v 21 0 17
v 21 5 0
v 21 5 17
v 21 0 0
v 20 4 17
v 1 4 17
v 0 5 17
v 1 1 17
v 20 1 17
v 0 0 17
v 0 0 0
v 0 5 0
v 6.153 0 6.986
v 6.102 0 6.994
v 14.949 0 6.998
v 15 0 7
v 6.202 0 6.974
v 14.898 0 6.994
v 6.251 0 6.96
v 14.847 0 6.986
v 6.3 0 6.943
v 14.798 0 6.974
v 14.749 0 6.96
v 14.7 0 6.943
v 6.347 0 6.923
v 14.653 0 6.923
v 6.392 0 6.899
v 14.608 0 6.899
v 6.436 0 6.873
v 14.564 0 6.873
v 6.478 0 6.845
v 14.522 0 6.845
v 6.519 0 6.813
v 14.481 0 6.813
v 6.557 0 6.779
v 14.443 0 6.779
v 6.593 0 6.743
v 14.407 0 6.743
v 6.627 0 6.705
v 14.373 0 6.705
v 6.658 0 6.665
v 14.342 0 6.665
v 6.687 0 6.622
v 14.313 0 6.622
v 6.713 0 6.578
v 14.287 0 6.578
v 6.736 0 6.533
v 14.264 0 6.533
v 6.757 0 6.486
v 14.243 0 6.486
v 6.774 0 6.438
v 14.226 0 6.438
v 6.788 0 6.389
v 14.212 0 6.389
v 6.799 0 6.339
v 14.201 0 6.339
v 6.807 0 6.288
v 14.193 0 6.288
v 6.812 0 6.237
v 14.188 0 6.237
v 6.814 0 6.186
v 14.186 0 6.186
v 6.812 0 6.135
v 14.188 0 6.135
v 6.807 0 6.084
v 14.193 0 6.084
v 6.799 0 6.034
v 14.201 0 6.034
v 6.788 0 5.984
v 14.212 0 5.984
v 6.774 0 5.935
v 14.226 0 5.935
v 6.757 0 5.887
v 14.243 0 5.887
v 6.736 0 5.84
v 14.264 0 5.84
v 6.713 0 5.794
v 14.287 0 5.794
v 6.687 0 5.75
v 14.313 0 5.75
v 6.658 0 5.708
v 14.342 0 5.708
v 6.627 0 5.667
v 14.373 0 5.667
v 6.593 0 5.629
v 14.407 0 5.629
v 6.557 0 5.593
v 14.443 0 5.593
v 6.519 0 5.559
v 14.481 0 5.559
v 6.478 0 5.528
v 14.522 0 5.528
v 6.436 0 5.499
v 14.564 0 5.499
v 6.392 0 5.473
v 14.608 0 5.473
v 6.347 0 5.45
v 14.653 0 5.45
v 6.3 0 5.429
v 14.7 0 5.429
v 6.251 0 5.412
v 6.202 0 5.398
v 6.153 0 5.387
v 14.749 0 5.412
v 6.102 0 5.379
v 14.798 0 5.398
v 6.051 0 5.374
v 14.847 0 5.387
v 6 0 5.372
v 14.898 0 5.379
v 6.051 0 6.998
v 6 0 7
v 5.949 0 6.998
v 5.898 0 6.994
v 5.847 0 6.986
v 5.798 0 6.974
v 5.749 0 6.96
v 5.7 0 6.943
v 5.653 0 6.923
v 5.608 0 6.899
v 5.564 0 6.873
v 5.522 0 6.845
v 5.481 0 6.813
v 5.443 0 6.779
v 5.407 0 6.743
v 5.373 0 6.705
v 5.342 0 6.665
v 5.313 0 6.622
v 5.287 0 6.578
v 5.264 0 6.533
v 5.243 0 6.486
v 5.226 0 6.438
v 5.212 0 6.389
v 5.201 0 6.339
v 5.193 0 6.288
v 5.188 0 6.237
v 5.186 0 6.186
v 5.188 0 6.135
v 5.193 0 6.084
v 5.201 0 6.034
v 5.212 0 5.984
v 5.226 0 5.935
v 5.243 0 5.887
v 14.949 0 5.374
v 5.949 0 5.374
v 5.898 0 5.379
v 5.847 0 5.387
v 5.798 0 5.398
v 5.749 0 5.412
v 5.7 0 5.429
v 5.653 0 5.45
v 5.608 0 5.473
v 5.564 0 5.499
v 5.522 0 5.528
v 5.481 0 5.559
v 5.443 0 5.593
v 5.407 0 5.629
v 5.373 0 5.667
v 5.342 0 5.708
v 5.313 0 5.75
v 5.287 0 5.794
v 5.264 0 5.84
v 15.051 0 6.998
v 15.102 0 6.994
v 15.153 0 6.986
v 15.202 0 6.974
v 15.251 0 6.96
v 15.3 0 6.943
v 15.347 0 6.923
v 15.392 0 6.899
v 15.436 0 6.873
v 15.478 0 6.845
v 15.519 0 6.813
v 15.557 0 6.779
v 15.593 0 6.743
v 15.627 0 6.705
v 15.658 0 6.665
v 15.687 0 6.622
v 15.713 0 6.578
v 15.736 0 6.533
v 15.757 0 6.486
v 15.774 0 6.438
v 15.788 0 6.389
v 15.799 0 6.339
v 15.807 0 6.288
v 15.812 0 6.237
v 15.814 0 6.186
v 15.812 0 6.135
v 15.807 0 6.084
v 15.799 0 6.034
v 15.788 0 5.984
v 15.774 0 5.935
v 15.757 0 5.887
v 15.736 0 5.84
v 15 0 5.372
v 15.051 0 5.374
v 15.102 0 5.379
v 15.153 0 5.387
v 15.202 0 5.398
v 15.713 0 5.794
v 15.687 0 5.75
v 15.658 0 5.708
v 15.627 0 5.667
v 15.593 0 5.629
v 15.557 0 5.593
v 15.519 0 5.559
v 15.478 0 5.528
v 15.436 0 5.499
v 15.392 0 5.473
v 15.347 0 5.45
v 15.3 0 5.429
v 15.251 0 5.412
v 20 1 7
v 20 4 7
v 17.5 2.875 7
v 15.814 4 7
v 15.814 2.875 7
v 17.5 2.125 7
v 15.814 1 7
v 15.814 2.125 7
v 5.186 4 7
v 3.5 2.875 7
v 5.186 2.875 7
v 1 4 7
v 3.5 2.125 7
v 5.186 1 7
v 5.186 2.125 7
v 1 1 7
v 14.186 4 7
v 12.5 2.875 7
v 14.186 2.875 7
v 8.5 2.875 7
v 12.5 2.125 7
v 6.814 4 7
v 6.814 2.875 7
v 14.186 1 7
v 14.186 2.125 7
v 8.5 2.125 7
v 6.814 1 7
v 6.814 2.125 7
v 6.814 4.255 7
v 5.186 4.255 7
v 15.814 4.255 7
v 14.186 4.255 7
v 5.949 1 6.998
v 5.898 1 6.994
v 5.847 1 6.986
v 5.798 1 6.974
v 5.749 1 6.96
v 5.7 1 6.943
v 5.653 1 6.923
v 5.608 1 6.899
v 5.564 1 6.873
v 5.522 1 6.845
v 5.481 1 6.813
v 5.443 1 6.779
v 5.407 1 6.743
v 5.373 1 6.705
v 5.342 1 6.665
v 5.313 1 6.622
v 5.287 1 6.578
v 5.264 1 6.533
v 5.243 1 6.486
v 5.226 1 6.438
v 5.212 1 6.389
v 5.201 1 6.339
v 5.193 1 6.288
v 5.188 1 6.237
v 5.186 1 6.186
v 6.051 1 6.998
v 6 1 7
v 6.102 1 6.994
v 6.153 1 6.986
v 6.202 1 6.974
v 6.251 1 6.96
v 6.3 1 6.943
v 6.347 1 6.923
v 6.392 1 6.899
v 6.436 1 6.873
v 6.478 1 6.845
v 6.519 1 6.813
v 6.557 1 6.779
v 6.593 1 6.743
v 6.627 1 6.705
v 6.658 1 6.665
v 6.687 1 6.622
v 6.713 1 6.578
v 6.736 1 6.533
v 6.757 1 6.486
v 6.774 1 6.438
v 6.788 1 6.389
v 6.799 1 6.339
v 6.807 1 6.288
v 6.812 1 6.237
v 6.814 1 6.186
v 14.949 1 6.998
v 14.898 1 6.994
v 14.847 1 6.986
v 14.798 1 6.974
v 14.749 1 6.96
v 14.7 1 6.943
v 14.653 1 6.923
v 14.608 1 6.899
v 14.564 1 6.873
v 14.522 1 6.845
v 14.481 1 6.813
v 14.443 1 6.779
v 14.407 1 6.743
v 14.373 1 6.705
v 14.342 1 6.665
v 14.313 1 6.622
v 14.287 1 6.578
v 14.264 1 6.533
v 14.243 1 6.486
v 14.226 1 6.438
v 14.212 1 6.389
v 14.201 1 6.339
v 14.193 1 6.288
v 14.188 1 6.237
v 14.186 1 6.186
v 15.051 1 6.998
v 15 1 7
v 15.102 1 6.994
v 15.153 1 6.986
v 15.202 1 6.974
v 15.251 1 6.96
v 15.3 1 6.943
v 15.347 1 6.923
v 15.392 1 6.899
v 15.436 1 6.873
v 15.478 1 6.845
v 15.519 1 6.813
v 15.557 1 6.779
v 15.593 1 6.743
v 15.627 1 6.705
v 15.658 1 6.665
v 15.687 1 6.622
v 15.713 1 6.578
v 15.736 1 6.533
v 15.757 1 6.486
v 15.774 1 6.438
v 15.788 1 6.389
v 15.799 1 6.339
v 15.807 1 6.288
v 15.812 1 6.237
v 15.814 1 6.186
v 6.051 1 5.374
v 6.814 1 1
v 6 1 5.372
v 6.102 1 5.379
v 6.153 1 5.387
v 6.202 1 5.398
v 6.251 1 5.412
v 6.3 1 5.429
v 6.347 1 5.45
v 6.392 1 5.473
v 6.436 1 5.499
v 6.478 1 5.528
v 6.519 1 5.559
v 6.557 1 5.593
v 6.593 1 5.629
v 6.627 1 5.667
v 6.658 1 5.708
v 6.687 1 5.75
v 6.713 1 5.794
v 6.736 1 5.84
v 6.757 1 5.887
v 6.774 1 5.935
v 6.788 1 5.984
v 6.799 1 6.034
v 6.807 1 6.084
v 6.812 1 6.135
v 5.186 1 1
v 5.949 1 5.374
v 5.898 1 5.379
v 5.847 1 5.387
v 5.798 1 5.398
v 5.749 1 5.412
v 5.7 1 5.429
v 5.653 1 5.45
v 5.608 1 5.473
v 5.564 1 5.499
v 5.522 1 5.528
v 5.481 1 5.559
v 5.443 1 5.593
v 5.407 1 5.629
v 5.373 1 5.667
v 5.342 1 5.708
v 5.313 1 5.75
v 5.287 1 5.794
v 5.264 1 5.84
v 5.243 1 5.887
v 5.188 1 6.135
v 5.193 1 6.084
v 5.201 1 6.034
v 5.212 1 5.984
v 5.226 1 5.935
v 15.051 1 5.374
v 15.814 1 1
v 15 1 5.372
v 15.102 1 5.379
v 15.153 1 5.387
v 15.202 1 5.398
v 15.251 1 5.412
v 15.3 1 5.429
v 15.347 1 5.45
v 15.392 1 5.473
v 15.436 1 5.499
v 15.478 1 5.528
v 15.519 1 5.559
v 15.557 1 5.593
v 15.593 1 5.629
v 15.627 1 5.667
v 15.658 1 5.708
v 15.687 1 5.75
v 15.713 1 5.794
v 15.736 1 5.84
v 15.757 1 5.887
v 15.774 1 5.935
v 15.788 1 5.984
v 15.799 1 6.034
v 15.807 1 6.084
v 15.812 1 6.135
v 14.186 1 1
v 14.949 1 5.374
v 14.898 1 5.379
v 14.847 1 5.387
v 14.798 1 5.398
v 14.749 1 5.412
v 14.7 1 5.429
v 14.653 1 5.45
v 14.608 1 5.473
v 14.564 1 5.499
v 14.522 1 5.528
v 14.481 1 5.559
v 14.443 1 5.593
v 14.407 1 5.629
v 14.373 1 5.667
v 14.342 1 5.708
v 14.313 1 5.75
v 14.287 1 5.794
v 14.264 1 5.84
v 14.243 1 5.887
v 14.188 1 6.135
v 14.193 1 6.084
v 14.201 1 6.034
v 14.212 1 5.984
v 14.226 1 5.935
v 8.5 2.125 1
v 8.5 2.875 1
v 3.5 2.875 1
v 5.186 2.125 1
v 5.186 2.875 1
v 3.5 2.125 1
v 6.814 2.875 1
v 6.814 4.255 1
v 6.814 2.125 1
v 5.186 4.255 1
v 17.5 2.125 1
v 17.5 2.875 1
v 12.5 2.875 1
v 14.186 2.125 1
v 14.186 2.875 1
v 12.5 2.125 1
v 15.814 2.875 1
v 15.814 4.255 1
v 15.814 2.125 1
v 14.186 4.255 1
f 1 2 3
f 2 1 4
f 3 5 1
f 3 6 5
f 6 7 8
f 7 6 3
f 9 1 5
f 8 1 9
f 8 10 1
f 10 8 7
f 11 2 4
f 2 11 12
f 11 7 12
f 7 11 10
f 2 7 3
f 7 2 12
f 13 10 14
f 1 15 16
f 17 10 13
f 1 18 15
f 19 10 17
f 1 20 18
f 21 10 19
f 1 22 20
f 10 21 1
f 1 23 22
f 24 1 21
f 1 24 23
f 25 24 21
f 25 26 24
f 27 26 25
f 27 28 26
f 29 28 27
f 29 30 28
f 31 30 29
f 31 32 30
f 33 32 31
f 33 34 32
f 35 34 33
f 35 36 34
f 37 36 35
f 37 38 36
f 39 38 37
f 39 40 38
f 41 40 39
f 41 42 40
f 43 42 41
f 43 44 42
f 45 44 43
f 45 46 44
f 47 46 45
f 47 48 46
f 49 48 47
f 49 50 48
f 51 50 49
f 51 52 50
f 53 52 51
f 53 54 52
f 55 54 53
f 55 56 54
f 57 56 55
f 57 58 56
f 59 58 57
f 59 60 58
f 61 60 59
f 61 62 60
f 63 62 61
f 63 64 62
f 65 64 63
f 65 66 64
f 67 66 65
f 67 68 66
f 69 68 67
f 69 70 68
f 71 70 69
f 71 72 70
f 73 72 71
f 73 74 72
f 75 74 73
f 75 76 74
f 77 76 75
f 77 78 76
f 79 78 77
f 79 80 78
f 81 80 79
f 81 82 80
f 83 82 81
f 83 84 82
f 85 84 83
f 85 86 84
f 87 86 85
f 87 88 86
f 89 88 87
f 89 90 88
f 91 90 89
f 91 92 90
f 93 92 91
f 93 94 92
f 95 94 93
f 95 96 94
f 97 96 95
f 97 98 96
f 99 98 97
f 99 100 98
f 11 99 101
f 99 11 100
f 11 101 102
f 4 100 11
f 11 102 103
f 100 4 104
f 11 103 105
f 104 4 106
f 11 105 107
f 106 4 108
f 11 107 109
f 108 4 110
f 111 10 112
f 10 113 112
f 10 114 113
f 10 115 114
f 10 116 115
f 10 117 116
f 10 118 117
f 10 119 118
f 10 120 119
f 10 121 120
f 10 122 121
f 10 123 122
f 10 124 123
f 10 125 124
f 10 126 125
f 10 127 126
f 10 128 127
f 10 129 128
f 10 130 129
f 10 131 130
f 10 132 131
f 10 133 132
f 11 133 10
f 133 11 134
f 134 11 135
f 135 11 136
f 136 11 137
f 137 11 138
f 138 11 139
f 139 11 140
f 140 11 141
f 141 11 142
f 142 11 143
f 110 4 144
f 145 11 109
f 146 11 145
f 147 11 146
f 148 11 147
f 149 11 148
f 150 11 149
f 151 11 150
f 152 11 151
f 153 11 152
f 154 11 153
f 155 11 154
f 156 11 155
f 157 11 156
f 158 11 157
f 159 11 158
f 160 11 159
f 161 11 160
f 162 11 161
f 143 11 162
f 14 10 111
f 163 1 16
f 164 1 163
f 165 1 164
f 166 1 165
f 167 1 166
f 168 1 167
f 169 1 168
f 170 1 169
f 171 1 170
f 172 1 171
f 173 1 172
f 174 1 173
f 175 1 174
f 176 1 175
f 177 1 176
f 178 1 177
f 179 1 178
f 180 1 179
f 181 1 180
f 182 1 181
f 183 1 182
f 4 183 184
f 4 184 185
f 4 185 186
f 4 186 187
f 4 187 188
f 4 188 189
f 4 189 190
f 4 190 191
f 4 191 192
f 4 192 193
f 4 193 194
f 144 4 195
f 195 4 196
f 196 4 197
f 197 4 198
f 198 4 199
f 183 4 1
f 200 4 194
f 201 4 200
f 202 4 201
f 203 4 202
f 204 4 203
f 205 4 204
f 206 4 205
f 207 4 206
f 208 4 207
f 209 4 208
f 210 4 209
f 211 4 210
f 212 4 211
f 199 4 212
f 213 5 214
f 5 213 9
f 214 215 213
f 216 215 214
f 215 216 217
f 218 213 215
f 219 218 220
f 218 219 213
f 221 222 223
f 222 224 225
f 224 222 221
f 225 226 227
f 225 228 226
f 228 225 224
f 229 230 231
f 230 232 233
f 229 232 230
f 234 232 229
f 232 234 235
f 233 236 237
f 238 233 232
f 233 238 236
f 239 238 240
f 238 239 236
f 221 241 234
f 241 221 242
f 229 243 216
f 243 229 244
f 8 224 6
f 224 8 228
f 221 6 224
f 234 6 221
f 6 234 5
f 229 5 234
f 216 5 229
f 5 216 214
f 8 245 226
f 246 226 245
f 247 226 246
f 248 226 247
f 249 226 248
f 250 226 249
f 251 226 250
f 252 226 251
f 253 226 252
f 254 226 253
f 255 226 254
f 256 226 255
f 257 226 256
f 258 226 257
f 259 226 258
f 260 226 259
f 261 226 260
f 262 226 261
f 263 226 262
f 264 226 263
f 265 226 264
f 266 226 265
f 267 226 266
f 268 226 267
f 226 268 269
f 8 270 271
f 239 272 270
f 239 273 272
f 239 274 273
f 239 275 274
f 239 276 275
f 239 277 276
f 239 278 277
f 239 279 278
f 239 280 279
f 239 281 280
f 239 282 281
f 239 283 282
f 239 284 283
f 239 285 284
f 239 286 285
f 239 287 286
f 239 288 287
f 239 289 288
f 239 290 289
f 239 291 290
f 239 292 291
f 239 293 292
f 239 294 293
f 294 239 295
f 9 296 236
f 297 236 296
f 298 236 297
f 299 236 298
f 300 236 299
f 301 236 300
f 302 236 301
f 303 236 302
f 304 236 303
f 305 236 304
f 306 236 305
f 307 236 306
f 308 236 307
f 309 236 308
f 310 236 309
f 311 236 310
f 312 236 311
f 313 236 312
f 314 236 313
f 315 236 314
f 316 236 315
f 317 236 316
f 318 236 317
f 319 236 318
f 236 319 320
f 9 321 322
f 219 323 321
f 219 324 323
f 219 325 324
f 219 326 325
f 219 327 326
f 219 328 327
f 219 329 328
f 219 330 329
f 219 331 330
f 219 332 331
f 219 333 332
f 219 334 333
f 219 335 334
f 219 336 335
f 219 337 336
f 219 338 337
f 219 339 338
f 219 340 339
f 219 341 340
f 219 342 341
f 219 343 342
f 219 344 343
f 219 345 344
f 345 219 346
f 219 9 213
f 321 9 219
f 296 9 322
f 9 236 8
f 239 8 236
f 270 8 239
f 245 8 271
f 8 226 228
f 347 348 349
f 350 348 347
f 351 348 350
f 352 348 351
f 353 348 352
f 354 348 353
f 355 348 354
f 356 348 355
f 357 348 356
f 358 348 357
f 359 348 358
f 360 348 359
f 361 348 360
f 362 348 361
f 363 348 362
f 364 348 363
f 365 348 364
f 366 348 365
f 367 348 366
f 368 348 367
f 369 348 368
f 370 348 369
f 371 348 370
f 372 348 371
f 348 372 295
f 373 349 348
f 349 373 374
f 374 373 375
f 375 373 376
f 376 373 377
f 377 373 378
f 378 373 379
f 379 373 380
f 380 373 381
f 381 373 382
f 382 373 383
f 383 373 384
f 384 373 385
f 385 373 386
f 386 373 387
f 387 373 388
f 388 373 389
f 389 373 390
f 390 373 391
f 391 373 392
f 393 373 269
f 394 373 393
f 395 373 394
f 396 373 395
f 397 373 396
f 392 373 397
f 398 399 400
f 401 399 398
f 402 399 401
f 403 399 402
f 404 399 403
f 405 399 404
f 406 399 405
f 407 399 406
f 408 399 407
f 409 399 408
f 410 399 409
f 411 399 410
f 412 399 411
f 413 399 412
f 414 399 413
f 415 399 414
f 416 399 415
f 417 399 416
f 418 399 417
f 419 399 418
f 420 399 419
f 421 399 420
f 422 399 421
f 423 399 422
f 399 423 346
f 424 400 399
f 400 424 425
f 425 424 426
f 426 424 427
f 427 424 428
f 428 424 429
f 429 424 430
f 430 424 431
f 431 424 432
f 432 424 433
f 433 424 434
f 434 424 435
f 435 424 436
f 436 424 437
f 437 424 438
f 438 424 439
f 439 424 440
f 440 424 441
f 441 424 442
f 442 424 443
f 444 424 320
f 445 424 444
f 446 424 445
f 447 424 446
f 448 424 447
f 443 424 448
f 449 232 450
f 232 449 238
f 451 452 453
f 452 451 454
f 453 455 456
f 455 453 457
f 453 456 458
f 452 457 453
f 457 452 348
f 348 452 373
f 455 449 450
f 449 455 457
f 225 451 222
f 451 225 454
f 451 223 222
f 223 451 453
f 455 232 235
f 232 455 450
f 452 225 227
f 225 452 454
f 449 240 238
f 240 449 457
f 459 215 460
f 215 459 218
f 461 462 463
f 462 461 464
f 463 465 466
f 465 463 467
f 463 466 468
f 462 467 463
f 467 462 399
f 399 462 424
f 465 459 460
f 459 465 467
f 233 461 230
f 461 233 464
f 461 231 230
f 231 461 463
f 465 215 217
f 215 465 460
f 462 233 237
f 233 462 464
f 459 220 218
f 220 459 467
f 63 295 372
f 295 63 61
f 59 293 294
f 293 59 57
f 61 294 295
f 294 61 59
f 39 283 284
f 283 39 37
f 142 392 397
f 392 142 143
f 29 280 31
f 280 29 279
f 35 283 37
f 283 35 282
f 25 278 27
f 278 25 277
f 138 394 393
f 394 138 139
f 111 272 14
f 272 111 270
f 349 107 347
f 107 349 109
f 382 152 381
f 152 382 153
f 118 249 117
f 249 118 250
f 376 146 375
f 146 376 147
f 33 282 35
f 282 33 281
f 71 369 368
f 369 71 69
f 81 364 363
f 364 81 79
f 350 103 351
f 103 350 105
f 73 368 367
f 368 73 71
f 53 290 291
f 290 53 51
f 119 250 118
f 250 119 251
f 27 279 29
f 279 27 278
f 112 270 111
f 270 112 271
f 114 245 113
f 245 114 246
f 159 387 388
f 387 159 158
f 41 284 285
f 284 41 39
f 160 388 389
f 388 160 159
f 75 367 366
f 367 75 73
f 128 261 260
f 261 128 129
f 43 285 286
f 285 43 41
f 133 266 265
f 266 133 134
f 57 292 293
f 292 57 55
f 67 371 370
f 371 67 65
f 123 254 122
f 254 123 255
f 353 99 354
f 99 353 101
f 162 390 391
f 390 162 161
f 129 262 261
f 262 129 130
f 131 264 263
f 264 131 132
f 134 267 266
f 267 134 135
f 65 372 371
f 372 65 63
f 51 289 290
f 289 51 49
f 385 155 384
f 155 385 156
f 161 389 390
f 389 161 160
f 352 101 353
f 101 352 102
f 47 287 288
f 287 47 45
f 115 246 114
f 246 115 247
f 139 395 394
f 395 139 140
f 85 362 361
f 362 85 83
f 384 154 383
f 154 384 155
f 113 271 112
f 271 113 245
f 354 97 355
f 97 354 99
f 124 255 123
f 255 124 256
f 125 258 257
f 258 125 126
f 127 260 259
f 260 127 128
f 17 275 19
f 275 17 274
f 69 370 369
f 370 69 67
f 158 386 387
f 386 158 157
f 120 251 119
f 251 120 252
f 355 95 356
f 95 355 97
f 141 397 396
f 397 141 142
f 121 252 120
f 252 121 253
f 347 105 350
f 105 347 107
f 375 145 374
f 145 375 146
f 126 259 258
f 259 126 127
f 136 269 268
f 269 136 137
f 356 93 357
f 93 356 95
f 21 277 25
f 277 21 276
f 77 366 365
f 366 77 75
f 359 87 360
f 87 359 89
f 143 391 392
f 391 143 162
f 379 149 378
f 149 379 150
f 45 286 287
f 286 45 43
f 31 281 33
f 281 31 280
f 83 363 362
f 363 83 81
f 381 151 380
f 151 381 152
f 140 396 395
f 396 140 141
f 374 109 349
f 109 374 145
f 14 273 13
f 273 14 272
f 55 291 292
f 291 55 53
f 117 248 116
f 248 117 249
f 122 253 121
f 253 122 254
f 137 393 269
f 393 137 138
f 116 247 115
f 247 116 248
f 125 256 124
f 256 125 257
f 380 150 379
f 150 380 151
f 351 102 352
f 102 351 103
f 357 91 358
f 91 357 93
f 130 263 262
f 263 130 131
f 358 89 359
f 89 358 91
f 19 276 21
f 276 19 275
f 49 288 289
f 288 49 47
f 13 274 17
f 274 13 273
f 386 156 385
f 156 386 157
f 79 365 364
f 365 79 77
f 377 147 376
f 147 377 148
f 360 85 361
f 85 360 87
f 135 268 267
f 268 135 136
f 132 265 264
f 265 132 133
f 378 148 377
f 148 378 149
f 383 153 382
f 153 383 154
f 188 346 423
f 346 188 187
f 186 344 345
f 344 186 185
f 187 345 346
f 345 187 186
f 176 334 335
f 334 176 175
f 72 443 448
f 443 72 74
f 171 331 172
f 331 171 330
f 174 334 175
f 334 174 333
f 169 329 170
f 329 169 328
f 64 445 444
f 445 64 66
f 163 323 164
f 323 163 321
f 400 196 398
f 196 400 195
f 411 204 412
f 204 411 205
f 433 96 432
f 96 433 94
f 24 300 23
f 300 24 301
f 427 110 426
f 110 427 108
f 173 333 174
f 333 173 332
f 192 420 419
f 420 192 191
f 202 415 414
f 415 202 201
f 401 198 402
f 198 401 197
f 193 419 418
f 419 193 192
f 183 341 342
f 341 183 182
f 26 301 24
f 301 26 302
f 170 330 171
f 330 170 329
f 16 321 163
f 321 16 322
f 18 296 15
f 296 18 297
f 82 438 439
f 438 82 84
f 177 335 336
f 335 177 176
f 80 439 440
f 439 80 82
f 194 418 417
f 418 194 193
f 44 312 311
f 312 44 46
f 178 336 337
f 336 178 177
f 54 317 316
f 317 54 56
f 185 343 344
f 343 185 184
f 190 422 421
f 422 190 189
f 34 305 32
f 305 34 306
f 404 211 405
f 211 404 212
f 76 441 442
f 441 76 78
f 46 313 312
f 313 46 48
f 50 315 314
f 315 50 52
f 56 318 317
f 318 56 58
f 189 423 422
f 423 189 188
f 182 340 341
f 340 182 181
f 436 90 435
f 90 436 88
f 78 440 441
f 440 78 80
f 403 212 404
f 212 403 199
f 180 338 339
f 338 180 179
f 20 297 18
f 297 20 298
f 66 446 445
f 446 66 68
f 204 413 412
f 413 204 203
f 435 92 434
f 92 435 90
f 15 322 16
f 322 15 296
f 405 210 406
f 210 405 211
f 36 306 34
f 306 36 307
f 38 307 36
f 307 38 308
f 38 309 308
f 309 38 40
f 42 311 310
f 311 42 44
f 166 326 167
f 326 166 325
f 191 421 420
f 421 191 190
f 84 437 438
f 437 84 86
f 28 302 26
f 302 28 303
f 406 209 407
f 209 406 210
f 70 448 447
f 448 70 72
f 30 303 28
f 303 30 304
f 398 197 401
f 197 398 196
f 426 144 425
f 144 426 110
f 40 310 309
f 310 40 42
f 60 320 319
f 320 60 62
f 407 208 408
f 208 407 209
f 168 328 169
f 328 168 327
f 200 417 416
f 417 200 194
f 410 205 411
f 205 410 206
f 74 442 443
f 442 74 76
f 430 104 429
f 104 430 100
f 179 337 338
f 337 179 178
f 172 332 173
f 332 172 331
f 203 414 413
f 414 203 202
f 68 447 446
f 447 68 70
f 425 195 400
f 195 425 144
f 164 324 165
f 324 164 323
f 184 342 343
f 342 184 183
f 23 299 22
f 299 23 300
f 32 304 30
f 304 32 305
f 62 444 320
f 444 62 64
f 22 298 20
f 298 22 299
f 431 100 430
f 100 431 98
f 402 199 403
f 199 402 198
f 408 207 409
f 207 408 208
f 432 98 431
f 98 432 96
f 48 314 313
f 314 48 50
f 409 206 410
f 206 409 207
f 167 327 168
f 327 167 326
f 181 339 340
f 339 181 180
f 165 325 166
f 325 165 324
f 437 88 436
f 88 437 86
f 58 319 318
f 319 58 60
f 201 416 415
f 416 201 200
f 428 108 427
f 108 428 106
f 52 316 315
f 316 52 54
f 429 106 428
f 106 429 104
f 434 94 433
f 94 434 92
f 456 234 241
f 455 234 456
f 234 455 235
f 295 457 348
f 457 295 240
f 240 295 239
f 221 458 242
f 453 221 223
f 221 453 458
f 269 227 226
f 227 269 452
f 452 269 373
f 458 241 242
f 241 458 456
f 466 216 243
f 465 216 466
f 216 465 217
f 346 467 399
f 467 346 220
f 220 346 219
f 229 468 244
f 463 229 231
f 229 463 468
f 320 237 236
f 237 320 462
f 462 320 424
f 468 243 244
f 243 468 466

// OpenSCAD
$fn = 100;

outer_border = 1;

plastic_width = 19;
plastic_thickness = 3;
plastic_height = 10;

blade_height = 6;
blade_width = 5;
blade_thickness = 0.75;

blade_spacing = 4;

wire_awg = 14;

function wire_diameter_from_awg(awg) = 0.127 * pow(92, (36 - awg)/39);

difference() {
    cube([plastic_width + 2 * outer_border, plastic_thickness + 2 * outer_border, plastic_height + blade_height + outer_border]);
    
    fuse_height = plastic_height + blade_height;
    
    // Plastic cutouot
    translate([outer_border, outer_border, fuse_height - plastic_height + outer_border])
        cube([plastic_width, plastic_thickness, plastic_height]);
    
    // Left blade cutout
    translate([outer_border + plastic_width / 2 - blade_width - blade_spacing / 2, outer_border + plastic_thickness / 2 - blade_thickness / 2, outer_border])
        cube([blade_width, blade_thickness, blade_height]);
    
    // Right blade cutout
    translate([outer_border + plastic_width / 2 + blade_spacing / 2, outer_border + plastic_thickness / 2 - blade_thickness / 2, outer_border])
        cube([blade_width, blade_thickness, blade_height]);
    
    wire_cutout_depth = (plastic_thickness + 2 * outer_border) / 2; // Half thickness of fuse holder
    wire_cutout_diameter = wire_diameter_from_awg(wire_awg);

    // Left wire insert
    translate([outer_border + plastic_width / 2 - blade_spacing / 2 - blade_width / 2, wire_cutout_depth / 2, outer_border + blade_height - wire_cutout_diameter / 2])
        rotate([90, 0, 0])
            cylinder(h = wire_cutout_depth, d = wire_cutout_diameter, center = true);
            
    // Right wire insert
    translate([outer_border + plastic_width / 2 + blade_spacing / 2 + blade_width / 2, wire_cutout_depth / 2, outer_border + blade_height - wire_cutout_diameter / 2])
        rotate([90, 0, 0])
            cylinder(h = wire_cutout_depth, d = wire_cutout_diameter, center = true);

    // Left wire cutout
    translate([outer_border + plastic_width / 2 - blade_spacing / 2 - blade_width / 2, wire_cutout_diameter + outer_border, blade_height / 2 + outer_border])
        cube([wire_cutout_diameter, wire_cutout_diameter * 2, blade_height], center= true);

    // Right wire cutout
    translate([outer_border + plastic_width / 2 + blade_spacing / 2 + blade_width / 2, wire_cutout_diameter + outer_border, blade_height / 2 + outer_border])
        cube([wire_cutout_diameter, wire_cutout_diameter * 2, blade_height], center= true);
}
